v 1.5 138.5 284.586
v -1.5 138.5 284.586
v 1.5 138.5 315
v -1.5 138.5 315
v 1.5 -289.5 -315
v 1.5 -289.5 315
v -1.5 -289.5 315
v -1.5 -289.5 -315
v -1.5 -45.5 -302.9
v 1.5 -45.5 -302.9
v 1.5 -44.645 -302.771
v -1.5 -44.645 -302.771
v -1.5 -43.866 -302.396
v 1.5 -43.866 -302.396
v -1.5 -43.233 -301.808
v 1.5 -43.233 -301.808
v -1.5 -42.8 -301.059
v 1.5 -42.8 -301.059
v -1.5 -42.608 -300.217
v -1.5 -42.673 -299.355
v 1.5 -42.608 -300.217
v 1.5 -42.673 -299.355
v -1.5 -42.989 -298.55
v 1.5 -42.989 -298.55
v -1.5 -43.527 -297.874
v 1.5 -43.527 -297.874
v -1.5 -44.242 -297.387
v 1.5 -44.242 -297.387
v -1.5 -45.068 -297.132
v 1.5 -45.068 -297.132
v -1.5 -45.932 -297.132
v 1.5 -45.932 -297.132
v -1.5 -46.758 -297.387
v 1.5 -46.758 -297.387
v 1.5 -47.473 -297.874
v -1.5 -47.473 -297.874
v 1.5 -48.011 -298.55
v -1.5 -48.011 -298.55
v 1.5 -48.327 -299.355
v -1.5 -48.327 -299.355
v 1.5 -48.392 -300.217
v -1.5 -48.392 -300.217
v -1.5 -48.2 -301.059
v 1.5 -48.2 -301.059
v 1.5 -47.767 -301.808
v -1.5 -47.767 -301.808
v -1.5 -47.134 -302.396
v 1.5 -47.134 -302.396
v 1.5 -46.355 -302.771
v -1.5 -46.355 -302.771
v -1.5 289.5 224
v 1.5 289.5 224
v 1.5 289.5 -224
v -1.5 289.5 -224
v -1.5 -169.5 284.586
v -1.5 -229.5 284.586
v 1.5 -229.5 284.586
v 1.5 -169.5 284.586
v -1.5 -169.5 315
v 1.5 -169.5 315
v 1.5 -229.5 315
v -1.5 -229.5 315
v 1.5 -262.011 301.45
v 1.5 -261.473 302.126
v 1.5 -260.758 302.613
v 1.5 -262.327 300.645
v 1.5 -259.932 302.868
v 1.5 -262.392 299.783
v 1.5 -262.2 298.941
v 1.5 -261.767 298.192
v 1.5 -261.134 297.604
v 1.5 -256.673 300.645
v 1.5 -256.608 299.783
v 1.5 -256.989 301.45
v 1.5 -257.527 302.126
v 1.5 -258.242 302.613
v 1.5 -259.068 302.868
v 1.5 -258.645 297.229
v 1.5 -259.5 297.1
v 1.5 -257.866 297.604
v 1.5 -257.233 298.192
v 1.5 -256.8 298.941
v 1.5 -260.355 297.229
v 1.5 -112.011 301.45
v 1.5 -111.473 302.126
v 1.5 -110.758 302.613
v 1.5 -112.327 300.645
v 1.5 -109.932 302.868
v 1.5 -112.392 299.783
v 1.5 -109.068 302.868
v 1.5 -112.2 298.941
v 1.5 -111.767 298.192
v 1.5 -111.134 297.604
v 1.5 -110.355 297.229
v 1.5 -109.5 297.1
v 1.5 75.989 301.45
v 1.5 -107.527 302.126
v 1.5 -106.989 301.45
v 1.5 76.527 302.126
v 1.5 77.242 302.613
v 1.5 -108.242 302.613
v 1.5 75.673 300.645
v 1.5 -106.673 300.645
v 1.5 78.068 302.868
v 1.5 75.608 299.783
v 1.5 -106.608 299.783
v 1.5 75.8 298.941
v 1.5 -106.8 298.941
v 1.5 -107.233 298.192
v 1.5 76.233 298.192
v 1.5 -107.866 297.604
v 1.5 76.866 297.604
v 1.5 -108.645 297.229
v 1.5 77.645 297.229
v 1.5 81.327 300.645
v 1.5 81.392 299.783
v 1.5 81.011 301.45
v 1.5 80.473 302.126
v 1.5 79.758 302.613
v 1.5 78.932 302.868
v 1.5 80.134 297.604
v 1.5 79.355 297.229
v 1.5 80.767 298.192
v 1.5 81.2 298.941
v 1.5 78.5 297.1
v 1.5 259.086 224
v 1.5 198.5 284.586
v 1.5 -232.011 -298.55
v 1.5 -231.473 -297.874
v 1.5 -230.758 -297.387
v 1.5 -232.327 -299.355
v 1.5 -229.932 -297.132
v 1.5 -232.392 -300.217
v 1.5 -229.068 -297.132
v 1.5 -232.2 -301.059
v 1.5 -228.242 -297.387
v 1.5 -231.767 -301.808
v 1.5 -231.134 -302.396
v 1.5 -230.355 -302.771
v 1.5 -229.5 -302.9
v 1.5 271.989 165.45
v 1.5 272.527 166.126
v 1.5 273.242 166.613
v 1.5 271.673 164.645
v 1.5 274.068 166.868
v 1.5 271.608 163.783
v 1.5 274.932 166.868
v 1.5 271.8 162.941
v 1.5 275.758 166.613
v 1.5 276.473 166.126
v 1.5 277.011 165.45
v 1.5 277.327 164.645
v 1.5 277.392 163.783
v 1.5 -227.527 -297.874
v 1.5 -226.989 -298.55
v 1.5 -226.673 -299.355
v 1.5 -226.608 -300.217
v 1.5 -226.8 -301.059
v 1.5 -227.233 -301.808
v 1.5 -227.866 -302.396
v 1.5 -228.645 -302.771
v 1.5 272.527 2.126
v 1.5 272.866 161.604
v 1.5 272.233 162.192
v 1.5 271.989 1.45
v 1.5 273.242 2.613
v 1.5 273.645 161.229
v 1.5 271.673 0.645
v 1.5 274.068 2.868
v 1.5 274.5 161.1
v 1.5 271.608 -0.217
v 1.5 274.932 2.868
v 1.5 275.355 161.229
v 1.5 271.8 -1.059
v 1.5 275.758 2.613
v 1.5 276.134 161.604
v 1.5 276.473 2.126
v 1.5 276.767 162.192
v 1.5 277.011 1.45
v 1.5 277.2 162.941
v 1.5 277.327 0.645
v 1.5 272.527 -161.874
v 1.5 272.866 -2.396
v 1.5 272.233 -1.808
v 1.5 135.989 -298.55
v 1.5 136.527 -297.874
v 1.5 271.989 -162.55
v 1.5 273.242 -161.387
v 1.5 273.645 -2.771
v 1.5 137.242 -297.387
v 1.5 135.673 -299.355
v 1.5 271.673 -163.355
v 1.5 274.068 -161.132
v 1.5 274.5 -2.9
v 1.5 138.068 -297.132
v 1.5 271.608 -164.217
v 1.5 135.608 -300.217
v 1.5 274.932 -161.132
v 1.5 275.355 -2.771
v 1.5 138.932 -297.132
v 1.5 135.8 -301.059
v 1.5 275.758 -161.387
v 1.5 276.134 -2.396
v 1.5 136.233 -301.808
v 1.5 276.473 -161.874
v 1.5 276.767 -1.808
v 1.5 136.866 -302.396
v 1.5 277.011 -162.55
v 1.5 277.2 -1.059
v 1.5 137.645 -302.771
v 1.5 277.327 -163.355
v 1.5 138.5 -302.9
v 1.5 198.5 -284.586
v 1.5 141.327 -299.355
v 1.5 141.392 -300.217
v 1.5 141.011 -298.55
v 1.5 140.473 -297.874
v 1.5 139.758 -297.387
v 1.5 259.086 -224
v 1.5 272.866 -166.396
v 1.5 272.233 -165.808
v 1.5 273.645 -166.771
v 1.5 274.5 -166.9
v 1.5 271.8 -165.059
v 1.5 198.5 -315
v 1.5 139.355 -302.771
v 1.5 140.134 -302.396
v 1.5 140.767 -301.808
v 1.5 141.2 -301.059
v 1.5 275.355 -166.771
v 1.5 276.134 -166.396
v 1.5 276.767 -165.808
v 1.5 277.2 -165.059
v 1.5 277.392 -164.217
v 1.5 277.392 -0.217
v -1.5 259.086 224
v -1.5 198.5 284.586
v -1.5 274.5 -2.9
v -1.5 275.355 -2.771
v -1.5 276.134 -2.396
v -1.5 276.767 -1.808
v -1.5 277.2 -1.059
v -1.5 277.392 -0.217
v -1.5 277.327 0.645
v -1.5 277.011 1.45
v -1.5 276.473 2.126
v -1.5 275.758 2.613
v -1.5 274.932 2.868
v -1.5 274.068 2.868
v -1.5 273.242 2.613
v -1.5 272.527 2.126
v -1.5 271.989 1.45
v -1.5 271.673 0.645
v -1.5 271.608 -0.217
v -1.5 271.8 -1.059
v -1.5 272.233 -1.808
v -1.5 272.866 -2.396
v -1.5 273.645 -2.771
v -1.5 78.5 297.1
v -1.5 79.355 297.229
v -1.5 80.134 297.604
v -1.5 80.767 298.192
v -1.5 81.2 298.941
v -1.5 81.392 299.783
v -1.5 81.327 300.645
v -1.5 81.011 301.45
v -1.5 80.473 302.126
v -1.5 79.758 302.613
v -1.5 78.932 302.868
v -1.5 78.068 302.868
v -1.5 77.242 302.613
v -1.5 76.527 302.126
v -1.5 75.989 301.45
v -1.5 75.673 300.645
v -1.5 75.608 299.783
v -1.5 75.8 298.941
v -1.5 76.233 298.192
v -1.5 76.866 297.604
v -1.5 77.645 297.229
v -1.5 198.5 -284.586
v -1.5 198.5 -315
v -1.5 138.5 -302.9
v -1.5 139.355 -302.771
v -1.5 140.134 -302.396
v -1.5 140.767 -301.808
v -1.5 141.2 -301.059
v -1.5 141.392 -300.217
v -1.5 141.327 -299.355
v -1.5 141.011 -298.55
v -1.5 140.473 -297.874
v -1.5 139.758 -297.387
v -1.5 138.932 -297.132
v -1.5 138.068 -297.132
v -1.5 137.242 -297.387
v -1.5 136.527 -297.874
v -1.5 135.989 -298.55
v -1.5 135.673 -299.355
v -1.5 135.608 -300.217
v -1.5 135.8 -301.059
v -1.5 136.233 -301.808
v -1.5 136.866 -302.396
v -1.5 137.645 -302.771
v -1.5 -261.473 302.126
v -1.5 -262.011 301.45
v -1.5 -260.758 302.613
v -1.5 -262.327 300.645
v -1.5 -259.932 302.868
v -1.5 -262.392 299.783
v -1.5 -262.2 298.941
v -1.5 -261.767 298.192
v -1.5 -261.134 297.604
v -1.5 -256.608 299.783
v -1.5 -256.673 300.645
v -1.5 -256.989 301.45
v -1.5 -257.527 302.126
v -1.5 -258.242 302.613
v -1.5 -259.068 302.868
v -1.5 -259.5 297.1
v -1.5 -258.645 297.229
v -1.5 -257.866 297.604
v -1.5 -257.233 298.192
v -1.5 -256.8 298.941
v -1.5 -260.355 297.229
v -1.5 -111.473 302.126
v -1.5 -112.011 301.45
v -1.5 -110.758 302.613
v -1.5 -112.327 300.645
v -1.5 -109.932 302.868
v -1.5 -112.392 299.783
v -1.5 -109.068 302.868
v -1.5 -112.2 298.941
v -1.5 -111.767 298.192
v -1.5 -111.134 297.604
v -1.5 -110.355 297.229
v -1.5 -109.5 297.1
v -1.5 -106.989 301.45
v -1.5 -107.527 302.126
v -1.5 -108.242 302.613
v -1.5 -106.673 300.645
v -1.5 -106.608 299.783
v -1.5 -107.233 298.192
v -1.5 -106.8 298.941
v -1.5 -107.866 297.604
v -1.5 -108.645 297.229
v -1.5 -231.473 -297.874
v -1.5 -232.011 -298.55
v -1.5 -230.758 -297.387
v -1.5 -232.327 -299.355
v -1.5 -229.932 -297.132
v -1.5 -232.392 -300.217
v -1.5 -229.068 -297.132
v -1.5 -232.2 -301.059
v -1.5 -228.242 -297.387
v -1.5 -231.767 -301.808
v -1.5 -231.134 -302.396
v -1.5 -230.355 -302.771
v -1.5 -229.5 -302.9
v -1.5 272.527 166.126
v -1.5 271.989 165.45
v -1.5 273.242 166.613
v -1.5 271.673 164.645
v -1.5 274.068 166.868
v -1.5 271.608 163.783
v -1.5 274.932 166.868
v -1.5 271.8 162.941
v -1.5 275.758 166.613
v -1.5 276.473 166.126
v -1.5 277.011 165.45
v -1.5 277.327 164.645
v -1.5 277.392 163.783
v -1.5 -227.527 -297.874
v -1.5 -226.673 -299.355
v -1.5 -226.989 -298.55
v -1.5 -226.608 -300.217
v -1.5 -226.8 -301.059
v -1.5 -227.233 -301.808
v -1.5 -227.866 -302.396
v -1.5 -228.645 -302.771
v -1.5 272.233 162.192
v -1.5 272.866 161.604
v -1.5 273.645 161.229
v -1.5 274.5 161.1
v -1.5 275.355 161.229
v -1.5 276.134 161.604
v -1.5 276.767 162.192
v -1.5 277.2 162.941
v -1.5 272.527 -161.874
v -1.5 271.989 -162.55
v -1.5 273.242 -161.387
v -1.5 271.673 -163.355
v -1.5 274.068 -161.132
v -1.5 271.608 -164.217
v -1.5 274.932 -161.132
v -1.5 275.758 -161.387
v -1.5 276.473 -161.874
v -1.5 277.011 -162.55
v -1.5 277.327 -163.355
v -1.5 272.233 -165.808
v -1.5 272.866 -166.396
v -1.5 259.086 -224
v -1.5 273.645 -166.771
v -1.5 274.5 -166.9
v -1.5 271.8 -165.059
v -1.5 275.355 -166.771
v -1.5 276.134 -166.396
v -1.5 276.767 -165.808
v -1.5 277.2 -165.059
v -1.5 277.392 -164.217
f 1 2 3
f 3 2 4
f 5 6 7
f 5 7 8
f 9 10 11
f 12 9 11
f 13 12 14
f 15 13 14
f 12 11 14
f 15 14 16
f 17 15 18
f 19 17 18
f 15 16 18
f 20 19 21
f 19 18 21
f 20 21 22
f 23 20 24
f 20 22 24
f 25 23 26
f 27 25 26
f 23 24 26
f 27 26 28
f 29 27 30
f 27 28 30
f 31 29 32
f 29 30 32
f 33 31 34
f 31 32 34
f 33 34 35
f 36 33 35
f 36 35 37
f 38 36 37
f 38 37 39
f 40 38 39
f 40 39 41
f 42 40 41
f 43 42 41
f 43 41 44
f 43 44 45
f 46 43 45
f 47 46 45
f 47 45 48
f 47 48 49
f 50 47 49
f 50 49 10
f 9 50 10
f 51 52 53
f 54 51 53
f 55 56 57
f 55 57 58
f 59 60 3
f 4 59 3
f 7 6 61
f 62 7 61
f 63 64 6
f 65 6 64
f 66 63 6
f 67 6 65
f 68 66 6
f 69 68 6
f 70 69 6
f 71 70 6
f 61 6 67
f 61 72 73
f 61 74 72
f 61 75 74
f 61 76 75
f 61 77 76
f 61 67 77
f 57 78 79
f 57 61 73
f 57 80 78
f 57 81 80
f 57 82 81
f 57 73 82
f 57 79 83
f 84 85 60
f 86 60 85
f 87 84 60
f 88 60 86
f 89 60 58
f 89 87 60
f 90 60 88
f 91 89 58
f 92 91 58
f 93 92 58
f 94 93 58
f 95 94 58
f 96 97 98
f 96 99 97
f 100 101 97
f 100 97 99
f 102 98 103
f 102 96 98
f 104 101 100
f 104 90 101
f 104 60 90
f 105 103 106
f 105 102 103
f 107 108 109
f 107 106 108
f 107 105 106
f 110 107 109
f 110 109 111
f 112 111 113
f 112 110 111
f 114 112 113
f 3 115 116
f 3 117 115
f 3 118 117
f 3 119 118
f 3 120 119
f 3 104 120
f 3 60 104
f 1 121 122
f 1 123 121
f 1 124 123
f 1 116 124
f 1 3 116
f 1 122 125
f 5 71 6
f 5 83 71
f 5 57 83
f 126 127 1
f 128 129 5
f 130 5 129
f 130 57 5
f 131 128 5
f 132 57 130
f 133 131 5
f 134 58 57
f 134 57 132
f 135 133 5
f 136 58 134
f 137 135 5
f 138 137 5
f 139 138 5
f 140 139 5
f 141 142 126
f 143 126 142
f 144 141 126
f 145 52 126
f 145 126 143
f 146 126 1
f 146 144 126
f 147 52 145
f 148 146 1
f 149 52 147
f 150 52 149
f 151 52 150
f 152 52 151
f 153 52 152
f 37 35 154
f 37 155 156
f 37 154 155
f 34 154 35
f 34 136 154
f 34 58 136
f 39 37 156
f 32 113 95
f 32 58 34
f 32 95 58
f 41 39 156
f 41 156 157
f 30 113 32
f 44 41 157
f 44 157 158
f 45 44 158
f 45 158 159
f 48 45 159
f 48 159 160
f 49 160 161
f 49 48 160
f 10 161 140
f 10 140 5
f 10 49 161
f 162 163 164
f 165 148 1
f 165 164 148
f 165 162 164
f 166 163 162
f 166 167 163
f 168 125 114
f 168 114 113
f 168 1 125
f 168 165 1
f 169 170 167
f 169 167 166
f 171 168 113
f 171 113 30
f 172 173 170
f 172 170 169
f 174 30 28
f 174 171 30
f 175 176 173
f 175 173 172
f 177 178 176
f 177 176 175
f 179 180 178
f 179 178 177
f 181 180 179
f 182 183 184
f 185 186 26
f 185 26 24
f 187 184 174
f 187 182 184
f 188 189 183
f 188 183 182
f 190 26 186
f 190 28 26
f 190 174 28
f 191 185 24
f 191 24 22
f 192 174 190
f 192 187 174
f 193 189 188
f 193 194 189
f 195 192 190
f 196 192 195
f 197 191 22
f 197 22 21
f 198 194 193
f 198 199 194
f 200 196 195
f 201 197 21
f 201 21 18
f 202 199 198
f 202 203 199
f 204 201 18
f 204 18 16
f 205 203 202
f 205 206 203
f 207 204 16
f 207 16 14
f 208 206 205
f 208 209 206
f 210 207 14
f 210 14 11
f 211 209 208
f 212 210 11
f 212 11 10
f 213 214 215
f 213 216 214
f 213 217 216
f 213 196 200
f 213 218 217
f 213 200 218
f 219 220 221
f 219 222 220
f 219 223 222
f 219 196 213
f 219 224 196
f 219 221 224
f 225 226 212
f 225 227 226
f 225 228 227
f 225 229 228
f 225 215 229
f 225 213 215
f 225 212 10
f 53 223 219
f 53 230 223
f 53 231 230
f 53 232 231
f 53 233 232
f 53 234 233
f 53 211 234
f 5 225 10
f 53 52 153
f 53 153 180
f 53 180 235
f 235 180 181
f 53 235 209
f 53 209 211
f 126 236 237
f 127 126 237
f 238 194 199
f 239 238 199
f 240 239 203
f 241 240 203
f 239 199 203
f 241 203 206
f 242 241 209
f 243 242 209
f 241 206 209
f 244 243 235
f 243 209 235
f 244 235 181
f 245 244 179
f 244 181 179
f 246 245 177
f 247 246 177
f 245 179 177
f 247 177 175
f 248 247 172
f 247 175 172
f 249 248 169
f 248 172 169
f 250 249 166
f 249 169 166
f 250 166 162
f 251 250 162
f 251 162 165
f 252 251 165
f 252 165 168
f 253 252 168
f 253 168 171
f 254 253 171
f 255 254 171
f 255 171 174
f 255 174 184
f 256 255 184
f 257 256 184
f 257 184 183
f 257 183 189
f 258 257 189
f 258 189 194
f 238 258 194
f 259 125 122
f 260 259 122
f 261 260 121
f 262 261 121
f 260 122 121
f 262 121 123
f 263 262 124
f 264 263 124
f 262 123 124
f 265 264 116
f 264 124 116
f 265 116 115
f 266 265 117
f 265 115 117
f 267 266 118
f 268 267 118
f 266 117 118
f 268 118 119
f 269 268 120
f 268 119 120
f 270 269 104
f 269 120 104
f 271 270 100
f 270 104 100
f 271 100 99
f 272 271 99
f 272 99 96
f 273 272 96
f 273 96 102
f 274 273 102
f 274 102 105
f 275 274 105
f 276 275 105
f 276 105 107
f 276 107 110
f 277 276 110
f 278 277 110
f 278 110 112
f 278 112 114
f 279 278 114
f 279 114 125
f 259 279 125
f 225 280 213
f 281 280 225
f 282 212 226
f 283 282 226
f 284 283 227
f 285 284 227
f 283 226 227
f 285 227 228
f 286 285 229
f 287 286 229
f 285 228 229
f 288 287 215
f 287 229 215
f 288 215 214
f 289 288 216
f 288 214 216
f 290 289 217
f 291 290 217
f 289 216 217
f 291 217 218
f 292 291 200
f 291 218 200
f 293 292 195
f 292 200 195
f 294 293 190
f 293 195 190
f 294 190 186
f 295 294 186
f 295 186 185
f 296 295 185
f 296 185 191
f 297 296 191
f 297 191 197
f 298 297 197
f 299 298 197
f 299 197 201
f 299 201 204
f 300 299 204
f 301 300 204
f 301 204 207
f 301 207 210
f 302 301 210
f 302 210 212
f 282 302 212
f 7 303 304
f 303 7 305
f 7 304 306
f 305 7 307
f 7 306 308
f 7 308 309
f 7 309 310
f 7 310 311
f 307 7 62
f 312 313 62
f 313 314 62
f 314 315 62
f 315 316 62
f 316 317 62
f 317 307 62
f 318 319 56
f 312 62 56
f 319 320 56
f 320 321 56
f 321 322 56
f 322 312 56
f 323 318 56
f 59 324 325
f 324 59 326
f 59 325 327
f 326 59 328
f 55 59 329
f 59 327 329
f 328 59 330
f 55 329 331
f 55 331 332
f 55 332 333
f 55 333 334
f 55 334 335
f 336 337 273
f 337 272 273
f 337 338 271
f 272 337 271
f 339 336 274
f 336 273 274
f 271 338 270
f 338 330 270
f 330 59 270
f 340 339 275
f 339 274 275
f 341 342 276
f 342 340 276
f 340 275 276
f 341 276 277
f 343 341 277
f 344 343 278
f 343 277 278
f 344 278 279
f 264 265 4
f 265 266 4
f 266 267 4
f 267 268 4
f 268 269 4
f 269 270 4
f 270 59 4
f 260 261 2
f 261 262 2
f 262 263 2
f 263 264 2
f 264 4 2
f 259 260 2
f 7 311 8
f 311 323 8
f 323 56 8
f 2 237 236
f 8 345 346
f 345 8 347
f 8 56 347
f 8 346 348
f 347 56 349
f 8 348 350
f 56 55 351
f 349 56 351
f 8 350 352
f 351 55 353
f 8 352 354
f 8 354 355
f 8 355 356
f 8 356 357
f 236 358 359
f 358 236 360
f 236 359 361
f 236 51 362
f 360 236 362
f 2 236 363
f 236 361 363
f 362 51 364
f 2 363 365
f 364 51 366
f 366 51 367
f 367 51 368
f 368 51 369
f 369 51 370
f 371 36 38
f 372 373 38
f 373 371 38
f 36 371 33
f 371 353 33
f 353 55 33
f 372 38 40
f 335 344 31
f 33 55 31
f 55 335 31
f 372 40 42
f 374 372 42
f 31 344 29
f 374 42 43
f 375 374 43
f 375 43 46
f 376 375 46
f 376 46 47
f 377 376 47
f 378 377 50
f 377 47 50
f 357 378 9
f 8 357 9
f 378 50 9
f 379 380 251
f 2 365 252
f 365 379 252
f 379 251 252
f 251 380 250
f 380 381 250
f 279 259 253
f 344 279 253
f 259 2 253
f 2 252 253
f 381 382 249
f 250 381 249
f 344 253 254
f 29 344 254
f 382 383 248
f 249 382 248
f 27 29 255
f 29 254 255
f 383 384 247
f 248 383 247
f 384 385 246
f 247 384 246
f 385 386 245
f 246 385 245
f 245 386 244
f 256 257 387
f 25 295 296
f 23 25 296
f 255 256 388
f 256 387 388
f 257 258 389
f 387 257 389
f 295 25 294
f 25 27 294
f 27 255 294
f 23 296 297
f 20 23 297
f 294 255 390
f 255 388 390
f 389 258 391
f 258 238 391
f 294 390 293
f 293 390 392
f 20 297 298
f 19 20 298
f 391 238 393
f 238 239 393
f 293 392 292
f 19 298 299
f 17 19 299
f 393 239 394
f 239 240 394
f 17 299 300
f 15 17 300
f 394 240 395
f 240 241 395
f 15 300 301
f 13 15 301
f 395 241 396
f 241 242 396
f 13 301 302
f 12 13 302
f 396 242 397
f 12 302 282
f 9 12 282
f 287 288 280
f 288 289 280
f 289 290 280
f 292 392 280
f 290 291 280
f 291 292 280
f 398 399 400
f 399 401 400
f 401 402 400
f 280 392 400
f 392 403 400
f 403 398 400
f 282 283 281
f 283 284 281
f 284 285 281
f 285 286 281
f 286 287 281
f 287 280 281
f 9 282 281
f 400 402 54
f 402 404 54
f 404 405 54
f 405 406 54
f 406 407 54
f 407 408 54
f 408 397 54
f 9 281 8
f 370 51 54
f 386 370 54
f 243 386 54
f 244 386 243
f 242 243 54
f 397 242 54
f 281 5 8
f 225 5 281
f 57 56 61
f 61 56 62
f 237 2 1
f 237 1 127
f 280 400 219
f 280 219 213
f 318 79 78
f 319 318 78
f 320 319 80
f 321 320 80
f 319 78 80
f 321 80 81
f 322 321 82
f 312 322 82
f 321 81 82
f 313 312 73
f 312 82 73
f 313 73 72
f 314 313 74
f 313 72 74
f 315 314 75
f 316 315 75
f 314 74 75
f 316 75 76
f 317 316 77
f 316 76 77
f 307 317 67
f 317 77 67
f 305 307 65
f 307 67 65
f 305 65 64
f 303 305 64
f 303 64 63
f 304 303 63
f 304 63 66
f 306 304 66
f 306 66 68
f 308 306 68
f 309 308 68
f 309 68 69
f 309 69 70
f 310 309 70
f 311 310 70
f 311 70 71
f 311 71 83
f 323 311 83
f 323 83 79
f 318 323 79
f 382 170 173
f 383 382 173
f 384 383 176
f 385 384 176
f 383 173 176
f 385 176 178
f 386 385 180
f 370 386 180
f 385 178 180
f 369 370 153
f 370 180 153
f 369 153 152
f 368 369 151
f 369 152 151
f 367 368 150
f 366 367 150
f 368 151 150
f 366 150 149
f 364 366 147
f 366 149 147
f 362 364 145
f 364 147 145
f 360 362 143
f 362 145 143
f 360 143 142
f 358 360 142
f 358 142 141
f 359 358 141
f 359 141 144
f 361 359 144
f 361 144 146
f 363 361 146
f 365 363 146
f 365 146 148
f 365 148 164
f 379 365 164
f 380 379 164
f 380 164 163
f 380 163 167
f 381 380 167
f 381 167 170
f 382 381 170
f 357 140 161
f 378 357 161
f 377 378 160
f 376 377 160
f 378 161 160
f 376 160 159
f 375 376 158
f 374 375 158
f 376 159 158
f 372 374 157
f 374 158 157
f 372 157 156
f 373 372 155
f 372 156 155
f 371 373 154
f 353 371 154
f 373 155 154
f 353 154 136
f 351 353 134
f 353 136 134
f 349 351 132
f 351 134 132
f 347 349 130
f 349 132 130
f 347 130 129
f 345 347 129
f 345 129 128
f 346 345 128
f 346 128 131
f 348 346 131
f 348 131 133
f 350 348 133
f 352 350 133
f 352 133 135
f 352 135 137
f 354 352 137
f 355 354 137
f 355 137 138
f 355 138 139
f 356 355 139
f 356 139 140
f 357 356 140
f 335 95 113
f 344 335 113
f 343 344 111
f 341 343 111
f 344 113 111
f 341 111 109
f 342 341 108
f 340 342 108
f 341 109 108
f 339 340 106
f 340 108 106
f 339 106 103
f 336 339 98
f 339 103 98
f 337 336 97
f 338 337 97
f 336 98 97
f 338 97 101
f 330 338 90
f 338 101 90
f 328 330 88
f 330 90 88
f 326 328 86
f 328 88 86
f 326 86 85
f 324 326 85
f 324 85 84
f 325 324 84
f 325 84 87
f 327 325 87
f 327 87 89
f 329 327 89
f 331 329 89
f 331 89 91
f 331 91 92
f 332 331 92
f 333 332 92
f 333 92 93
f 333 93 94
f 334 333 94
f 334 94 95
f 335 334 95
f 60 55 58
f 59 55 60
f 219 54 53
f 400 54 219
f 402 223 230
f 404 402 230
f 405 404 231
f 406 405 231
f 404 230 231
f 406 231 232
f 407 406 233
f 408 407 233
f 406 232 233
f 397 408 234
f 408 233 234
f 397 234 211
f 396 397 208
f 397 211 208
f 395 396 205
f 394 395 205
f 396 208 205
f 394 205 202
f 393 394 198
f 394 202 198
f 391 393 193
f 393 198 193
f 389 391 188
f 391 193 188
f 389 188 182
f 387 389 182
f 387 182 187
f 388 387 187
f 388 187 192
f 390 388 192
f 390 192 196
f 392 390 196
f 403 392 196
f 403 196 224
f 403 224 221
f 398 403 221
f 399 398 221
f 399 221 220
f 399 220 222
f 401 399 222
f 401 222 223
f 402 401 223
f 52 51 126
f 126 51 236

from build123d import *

# Parameters (mm, degrees)
SKETCH1_W            = 630
SKETCH1_H            = 579
BOSS_EXTRUDE1_DEPTH  = 1.5
CUT_EXTRUDE1_DEPTH   = 428.836709505
SKETCH3_W            = 30.414213562
SKETCH3_H            = 60
CUT_EXTRUDE2_DEPTH   = 428.836709505
M5_CLEARANCE_HOLE1_D = 5.8


with BuildPart() as part:
    # Sketch1 → Boss-Extrude1 (new, symmetric)
    with BuildSketch(Plane(origin=(0, 0, 0), x_dir=(0, 0, -1), z_dir=(1, 0, 0))):
        Rectangle(SKETCH1_W, SKETCH1_H)
    extrude(amount=BOSS_EXTRUDE1_DEPTH, both=True)

    # Sketch2 → Cut-Extrude1 (cut, through all)
    with BuildSketch(Plane.ZY.offset(1.5)):
        Polygon((-224, 289.5), (-224, 259.085786438), (-284.585786438, 198.5), (-315, 198.5), (-315, 289.5), align=None)
        Polygon((224, 289.5), (224, 259.085786438), (284.585786438, 198.5), (315, 198.5), (315, 289.5), align=None)
    extrude(amount=-CUT_EXTRUDE1_DEPTH, mode=Mode.SUBTRACT)

    # Sketch3 → Cut-Extrude2 (cut, through all)
    with BuildSketch(Plane.ZY.offset(1.5)):
        with Locations((299.792893219, 168.5)):
            Rectangle(SKETCH3_W, SKETCH3_H)
        with Locations((299.792893219, -199.5)):
            Rectangle(SKETCH3_W, SKETCH3_H)
    extrude(amount=-CUT_EXTRUDE2_DEPTH, mode=Mode.SUBTRACT)

    # M5 Clearance Hole1 (through all)
    with Locations(Plane.ZY.offset(1.5)):
        with Locations((-164, 274.5), (0, 274.5), (164, 274.5), (300, 78.5), (300, -109.5), (300, -259.5), (-300, -229.5), (-300, -45.5), (-300, 138.5)):
            Hole(M5_CLEARANCE_HOLE1_D / 2)


solid = part.part
